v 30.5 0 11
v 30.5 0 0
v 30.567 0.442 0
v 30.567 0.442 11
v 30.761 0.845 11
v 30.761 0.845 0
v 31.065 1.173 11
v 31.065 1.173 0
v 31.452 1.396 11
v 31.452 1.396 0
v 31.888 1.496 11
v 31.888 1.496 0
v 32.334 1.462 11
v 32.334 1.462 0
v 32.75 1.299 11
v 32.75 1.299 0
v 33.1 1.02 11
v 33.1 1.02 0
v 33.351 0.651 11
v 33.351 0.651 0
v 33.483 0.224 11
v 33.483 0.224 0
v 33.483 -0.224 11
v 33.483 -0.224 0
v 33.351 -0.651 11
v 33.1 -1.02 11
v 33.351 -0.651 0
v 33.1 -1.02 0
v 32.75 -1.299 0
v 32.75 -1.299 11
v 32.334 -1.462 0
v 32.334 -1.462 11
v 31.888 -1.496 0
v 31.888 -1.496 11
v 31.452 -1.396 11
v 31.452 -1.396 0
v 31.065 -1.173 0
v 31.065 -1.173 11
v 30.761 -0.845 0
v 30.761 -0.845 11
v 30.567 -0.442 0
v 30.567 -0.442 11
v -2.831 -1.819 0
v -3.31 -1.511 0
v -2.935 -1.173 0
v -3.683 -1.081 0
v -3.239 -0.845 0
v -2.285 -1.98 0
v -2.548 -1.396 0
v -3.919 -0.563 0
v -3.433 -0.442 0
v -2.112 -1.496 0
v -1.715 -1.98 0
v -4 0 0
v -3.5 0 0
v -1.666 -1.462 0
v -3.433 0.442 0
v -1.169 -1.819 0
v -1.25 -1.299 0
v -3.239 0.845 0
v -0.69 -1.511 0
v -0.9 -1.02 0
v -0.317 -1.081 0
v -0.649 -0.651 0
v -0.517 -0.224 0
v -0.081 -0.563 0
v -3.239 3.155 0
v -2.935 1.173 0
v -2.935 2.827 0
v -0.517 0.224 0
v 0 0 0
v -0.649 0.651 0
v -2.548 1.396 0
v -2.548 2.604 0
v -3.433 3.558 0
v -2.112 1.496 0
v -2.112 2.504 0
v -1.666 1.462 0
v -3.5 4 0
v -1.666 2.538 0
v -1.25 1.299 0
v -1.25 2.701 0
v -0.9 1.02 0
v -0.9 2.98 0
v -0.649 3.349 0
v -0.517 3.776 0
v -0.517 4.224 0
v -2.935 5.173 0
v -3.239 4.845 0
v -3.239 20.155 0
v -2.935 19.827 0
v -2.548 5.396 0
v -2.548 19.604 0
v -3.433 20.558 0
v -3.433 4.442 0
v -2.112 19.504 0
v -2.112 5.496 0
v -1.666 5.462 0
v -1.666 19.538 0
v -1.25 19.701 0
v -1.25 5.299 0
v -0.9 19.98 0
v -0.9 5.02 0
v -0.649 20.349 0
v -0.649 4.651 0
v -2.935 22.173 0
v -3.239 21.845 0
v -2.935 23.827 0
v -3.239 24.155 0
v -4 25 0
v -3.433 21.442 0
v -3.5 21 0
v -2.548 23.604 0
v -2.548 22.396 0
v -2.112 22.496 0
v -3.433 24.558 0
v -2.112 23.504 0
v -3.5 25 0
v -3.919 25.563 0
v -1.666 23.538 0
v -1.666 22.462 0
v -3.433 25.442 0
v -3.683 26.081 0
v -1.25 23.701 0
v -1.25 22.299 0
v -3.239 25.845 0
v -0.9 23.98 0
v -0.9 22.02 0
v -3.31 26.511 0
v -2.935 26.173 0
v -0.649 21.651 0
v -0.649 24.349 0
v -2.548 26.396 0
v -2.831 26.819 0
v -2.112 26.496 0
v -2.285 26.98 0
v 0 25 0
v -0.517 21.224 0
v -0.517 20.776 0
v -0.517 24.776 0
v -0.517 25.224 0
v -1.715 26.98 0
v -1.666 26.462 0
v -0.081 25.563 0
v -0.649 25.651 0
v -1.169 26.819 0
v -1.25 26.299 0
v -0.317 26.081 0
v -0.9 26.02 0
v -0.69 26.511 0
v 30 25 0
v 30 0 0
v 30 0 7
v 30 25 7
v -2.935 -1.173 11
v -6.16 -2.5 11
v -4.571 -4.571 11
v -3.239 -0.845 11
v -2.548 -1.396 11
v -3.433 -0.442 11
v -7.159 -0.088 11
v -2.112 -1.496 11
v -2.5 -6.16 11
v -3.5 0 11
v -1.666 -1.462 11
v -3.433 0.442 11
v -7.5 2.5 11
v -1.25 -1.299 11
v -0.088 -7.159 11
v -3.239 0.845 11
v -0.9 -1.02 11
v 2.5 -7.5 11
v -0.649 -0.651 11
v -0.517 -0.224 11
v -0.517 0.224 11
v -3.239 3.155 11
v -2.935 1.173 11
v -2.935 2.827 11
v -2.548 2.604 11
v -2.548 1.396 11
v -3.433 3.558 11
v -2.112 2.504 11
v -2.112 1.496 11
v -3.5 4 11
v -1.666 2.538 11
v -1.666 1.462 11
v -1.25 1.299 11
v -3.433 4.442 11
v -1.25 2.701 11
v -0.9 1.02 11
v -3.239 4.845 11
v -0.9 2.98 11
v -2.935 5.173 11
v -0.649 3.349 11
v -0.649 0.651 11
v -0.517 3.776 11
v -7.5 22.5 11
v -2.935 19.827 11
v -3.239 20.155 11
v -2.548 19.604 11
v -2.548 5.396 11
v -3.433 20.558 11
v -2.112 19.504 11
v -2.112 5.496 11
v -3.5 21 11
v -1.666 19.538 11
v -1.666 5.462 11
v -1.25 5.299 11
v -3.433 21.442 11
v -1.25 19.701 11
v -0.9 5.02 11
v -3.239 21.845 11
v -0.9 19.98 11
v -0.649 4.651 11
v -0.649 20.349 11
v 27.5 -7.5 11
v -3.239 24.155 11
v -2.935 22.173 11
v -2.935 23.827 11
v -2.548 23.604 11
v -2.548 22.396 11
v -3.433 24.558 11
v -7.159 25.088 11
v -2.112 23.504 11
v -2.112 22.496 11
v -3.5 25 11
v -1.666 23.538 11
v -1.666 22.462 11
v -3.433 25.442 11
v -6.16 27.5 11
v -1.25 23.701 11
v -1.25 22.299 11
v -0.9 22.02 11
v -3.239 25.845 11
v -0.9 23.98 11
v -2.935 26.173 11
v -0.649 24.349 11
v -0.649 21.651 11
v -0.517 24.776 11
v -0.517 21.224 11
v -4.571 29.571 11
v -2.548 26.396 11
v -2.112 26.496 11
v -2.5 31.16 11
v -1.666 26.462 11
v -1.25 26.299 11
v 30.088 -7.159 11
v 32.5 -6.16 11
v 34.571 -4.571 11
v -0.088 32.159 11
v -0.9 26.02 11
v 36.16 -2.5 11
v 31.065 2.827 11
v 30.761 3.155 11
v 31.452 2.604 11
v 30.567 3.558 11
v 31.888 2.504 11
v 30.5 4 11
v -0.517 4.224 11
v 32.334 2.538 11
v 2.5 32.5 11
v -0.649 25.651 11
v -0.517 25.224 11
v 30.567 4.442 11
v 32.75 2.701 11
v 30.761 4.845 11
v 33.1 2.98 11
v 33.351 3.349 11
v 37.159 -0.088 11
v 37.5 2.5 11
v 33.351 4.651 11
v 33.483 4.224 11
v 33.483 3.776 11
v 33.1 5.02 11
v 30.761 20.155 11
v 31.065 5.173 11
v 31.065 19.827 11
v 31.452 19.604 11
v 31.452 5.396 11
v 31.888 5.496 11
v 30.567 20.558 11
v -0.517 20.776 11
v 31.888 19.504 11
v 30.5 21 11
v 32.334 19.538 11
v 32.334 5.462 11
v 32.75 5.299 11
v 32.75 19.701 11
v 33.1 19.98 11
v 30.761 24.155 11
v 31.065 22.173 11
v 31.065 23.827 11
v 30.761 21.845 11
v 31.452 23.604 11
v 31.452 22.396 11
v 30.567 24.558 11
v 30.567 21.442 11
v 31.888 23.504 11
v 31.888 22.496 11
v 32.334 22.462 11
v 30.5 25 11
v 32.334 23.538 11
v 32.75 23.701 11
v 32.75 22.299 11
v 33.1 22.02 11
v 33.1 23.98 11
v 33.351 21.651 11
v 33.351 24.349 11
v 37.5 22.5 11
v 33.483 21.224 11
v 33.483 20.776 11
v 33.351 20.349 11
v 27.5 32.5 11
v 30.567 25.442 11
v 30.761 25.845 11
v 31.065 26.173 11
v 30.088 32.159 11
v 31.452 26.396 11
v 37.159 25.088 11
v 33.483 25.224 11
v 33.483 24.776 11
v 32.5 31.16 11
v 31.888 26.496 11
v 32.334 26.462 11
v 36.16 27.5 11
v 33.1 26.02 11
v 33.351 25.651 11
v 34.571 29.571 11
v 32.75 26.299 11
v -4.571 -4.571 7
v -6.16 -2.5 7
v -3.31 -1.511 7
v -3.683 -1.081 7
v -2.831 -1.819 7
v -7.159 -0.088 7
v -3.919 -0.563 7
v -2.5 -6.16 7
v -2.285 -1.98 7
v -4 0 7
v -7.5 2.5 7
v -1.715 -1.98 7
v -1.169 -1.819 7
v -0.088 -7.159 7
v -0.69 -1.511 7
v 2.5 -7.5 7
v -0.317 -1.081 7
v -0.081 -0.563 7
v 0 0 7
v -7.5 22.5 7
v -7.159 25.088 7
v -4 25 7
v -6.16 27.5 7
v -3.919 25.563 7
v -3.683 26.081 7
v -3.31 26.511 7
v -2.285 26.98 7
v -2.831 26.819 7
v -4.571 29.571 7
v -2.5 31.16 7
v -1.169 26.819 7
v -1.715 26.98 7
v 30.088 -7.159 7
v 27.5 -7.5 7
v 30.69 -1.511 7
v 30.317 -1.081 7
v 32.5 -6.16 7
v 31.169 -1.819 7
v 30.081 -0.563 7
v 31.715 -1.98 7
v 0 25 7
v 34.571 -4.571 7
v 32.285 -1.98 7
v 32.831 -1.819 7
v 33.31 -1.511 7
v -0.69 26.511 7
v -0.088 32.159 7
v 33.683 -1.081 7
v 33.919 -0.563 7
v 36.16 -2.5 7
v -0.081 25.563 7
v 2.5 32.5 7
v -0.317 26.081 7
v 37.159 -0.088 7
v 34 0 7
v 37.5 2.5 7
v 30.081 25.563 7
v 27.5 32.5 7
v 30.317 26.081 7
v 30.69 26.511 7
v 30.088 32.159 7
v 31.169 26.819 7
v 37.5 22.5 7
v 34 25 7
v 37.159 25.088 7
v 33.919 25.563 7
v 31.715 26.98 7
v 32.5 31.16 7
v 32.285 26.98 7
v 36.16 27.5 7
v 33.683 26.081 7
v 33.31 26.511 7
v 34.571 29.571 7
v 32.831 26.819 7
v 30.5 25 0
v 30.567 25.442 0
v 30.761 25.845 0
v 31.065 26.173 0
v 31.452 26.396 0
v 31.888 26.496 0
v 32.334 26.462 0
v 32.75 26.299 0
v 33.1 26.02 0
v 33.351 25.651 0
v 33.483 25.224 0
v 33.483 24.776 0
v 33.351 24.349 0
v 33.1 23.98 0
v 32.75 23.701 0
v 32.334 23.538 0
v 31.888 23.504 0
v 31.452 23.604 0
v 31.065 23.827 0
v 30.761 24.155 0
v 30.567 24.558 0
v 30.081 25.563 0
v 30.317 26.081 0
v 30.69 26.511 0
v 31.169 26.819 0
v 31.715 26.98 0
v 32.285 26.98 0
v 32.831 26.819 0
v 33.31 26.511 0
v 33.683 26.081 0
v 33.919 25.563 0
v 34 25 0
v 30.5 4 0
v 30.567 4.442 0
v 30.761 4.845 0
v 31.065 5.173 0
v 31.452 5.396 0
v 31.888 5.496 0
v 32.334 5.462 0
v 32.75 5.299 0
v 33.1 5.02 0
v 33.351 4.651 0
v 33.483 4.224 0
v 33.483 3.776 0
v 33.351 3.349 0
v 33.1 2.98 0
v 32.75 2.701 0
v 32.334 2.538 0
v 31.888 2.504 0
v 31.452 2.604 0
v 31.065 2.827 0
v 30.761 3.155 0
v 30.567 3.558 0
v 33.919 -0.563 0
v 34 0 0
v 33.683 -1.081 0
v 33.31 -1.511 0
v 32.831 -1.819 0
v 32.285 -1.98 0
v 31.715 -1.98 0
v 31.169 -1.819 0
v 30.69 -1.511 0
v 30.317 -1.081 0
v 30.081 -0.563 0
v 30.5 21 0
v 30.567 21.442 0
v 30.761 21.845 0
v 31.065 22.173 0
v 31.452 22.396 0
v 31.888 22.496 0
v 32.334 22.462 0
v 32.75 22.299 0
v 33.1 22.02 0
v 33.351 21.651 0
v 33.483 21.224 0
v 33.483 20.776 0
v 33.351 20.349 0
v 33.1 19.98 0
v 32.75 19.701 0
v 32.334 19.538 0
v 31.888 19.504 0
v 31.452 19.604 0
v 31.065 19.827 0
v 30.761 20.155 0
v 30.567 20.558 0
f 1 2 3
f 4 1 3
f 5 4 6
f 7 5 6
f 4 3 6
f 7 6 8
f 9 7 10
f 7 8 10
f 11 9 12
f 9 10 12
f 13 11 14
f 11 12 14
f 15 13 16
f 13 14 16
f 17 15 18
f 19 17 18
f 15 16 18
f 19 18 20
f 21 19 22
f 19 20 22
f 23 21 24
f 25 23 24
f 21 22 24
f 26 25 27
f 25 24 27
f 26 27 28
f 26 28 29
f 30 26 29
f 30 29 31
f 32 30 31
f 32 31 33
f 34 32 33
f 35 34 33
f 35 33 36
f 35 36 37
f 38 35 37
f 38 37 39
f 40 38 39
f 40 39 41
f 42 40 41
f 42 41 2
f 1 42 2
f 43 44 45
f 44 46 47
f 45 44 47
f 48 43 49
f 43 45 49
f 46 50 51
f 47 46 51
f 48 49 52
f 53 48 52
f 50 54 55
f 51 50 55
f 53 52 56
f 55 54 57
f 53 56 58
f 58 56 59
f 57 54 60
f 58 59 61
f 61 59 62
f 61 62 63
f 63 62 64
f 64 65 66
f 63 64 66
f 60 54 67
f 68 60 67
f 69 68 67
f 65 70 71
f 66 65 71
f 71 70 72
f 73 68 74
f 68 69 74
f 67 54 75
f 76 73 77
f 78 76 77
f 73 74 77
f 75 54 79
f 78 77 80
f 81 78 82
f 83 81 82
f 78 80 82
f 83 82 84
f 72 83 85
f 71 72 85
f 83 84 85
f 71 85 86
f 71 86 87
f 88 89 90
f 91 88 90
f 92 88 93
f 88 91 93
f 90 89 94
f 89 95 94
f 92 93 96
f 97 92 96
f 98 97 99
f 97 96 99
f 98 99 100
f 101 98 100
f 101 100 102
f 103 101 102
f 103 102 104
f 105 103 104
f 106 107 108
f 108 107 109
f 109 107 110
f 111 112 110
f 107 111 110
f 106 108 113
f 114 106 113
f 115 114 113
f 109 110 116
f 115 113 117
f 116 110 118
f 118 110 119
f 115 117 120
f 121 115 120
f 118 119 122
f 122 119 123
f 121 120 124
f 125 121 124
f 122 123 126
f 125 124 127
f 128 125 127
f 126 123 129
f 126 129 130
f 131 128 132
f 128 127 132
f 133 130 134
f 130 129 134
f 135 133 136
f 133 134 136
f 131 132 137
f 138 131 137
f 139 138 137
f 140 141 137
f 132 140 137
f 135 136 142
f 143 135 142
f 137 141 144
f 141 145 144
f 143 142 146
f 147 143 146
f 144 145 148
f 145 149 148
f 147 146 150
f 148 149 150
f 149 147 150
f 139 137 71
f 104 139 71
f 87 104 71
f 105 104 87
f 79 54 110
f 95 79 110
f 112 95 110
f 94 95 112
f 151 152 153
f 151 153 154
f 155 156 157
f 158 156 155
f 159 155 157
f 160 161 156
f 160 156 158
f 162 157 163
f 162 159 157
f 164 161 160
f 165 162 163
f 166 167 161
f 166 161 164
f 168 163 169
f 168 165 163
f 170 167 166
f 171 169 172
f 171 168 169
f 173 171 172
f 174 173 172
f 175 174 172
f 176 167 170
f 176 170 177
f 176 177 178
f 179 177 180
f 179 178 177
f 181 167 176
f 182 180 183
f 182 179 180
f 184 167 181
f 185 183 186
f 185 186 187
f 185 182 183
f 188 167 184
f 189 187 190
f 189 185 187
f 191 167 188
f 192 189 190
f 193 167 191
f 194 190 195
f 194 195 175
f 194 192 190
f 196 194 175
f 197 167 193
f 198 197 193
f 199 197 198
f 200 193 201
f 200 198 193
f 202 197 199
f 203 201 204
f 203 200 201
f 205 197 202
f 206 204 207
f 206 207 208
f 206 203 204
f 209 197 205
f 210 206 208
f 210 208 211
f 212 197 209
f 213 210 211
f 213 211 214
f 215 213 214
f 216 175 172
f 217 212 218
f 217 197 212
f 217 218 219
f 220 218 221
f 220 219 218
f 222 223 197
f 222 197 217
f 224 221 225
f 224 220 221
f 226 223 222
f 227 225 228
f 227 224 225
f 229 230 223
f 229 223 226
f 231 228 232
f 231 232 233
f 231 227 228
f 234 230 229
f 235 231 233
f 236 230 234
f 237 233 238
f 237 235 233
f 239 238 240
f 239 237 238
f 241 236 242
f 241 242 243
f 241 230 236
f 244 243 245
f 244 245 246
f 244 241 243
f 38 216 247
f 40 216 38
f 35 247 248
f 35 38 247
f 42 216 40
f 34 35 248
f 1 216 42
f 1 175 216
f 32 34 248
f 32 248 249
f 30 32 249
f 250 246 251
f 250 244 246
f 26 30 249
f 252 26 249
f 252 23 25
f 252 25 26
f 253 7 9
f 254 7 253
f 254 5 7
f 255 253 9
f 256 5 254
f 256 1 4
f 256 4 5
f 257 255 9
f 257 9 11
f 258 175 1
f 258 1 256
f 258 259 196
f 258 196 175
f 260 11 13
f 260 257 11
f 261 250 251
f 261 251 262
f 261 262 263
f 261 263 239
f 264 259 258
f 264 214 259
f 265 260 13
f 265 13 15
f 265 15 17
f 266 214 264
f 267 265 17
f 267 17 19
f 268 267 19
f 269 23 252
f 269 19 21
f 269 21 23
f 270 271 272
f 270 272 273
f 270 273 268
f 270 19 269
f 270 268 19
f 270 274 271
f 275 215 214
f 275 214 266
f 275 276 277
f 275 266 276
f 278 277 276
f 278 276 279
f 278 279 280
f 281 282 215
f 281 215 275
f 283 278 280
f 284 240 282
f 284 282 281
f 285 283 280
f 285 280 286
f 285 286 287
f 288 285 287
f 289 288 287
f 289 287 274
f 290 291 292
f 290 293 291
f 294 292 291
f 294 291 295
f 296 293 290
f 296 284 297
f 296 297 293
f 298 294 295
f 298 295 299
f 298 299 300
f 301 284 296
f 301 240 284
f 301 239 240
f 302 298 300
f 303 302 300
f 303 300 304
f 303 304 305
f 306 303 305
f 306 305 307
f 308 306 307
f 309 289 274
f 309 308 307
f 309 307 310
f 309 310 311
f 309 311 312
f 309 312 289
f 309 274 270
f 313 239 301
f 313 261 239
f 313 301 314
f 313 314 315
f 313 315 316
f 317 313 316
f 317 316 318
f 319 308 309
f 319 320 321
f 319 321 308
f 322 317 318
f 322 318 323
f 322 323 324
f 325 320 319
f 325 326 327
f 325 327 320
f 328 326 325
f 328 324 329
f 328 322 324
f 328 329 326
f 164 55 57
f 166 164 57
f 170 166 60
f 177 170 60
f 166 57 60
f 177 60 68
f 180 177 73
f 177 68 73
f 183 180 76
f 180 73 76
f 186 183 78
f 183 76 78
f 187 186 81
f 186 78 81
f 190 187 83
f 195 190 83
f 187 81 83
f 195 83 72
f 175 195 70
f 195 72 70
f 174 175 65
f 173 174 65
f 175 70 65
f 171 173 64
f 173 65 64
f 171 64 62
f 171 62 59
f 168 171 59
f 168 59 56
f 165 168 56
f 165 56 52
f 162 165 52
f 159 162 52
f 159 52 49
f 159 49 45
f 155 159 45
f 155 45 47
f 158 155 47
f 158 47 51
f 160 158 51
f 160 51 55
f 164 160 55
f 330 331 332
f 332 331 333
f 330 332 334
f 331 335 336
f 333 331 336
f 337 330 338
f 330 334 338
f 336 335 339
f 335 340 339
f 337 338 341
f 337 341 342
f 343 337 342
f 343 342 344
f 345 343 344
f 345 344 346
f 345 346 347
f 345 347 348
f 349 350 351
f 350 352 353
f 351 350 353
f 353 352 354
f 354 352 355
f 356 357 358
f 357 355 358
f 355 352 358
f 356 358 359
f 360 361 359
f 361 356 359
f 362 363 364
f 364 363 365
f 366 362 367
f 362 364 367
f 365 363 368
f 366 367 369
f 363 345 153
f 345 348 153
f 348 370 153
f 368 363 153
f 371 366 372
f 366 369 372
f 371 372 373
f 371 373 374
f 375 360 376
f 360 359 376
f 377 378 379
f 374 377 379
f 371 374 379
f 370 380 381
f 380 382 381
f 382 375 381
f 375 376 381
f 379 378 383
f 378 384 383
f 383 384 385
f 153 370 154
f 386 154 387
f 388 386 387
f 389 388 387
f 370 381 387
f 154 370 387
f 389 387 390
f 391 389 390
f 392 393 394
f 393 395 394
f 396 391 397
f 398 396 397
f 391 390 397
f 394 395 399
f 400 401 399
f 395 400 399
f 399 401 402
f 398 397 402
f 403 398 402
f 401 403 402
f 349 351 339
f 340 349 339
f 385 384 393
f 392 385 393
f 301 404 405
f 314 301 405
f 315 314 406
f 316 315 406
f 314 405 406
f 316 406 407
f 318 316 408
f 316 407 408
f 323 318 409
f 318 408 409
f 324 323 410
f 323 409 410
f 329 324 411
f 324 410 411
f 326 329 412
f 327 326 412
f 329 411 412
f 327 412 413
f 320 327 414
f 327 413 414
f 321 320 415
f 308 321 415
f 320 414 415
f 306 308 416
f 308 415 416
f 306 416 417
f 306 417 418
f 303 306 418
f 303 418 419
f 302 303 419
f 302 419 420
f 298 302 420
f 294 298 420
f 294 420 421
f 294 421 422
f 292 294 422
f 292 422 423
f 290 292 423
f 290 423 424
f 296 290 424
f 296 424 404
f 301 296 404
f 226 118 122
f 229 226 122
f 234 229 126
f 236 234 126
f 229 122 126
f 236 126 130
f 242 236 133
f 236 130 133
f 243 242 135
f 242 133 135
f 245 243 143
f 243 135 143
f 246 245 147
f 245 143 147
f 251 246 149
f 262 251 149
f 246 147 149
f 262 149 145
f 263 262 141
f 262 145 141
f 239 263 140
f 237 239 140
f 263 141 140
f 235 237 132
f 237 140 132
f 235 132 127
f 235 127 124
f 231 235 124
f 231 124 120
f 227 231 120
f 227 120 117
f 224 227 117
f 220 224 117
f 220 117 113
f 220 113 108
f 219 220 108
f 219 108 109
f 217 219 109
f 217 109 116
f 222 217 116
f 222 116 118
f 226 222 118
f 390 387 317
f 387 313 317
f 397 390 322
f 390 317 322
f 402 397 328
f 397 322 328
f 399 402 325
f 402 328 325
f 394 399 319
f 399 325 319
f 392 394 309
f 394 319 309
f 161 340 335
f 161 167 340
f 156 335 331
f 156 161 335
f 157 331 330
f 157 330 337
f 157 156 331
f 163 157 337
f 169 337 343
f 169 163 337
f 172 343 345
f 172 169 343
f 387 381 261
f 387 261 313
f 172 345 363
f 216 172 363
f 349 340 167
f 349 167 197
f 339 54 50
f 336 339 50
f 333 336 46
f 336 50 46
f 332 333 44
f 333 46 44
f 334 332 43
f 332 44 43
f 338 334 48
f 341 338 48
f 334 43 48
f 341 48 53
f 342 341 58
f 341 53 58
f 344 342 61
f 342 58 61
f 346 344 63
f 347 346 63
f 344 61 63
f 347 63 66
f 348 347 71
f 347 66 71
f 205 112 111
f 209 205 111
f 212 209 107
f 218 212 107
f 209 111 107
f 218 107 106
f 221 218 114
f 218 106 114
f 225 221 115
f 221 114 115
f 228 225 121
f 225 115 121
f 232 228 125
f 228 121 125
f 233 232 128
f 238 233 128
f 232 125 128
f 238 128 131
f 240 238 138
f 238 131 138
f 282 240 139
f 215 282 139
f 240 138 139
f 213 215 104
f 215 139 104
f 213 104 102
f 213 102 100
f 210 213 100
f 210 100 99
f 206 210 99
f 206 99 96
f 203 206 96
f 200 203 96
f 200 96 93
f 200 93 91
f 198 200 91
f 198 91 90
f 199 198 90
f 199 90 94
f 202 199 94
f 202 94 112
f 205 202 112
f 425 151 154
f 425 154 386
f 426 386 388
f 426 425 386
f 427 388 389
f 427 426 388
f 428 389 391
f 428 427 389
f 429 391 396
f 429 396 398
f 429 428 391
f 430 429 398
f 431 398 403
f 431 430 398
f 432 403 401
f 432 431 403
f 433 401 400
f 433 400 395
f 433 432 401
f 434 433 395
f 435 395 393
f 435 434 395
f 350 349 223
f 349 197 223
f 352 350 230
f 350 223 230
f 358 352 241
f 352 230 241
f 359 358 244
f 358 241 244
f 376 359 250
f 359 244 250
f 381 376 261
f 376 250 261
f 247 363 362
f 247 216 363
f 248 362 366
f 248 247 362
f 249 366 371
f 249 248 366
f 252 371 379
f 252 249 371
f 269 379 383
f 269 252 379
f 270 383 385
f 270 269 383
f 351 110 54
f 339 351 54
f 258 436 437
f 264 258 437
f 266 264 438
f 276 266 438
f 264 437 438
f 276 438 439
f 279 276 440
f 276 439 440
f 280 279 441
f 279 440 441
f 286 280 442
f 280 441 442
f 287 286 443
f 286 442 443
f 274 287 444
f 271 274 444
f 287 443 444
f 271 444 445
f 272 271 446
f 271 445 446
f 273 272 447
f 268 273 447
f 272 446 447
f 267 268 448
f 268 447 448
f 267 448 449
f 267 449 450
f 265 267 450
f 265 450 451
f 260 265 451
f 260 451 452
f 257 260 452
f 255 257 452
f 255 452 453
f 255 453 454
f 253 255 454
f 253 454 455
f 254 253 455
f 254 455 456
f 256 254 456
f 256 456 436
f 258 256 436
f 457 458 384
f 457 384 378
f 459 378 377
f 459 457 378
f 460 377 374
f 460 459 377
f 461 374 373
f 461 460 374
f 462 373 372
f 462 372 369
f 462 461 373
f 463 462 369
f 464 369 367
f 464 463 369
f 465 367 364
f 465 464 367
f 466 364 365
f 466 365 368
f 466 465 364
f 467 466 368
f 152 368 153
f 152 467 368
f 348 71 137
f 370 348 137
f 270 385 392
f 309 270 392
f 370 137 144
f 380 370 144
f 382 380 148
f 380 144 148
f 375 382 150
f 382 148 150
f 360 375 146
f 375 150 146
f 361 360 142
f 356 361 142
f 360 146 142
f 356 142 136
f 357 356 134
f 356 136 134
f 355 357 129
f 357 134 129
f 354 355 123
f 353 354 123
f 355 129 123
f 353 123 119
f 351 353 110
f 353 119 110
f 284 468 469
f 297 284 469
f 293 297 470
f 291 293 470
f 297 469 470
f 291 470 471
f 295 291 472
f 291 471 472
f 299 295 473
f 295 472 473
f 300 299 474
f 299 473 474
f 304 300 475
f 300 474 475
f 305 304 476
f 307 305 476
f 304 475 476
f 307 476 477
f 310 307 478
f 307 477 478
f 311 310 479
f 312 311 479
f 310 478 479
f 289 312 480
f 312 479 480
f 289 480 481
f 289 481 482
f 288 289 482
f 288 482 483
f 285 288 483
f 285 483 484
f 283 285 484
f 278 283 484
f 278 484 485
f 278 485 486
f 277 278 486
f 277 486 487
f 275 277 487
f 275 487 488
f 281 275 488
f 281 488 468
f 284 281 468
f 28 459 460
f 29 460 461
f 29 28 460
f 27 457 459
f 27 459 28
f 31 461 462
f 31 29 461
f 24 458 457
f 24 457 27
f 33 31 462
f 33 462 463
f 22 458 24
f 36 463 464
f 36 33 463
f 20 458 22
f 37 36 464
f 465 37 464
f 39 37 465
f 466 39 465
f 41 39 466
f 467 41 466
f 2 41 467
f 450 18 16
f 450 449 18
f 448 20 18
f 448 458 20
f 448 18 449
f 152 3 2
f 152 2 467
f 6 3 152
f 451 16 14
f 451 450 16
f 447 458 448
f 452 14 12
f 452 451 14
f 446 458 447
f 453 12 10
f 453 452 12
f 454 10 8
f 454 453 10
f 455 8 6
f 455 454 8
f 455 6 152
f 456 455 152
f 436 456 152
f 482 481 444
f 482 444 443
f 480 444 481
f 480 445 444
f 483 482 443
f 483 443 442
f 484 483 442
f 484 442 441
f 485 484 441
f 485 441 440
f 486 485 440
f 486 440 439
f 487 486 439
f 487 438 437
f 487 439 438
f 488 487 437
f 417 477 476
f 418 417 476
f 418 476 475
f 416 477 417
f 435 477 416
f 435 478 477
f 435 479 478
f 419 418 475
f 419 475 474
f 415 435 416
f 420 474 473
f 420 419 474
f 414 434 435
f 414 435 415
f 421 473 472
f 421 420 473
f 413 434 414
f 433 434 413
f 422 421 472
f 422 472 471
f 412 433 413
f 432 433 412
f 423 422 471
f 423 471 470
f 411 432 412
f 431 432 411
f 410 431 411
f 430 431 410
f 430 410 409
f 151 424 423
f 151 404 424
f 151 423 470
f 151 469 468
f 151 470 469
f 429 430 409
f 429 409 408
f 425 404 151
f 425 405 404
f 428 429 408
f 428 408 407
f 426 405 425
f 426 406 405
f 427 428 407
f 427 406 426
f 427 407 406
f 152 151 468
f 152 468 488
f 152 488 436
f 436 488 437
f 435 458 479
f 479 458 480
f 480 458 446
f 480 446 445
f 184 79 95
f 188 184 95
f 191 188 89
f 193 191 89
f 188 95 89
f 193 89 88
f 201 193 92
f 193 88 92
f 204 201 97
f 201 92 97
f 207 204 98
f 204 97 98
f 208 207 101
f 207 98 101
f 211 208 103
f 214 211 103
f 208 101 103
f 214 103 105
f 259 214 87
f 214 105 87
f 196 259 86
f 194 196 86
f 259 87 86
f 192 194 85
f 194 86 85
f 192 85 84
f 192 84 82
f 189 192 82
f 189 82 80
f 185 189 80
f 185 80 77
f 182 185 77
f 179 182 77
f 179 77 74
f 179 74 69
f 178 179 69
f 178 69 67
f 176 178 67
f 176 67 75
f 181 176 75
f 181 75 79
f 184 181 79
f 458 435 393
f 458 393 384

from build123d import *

# Parameters (mm, degrees)
BOSS_EXTRUDE1_DEPTH   = 7
BOSS_EXTRUDE1_2_DEPTH = 7
SKETCH2_W             = 45
SKETCH2_H             = 40
BOSS_EXTRUDE2_DEPTH   = 4
FILLET1_R             = 10
SKETCH3_R             = 1.5
CUT_EXTRUDE1_DEPTH    = 16


with BuildPart() as part:
    # Sketch1 → Boss-Extrude1 (new body)
    with BuildSketch(Plane.XY):
        with BuildLine():
            Line((0, 0), (0, 25))
            ThreePointArc((0, 25), (-2, 27), (-4, 25))
            Line((-4, 25), (-4, 0))
            ThreePointArc((-4, 0), (-2, -2), (0, 0))
        make_face()
    extrude(amount=BOSS_EXTRUDE1_DEPTH)



with BuildPart() as body_2:
    # Sketch1 → Boss-Extrude1 2 (new body)
    with BuildSketch(Plane.XY):
        with BuildLine():
            Line((30, 0), (30, 25))
            ThreePointArc((30, 25), (32, 27), (34, 25))
            Line((34, 25), (34, 0))
            ThreePointArc((34, 0), (32, -2), (30, 0))
        make_face()
    extrude(amount=BOSS_EXTRUDE1_2_DEPTH)


with BuildPart() as part_1:
    add(part.part)

    add(body_2.part)  # Boss-Extrude2 merges body 2
    # Sketch2 → Boss-Extrude2 (add)
    with BuildSketch(Plane.XY.offset(7)):
        with Locations((15, 12.5)):
            Rectangle(SKETCH2_W, SKETCH2_H)
    extrude(amount=BOSS_EXTRUDE2_DEPTH)

    # Fillet1
    fillet1_edges = [part_1.edges().sort_by_distance(p)[0] for p in [
        (37.5, -7.5, 9),
        (37.5, 32.5, 9),
        (-7.5, 32.5, 9),
        (-7.5, -7.5, 9),
    ]]
    fillet(fillet1_edges, radius=FILLET1_R)

    # Sketch3 → Cut-Extrude1 (cut)
    with BuildSketch(Plane(origin=(0, 0, 0), x_dir=(-1, 0, 0), z_dir=(0, 0, -1))):
        with Locations((-32, 0)):
            Circle(SKETCH3_R)
        with Locations((-32, 4)):
            Circle(SKETCH3_R)
        with Locations((2, 0)):
            Circle(SKETCH3_R)
        with Locations((2, 4)):
            Circle(SKETCH3_R)
        with Locations((-32, 25)):
            Circle(SKETCH3_R)
        with Locations((-32, 21)):
            Circle(SKETCH3_R)
        with Locations((2, 25)):
            Circle(SKETCH3_R)
        with Locations((2, 21)):
            Circle(SKETCH3_R)
    extrude(amount=-CUT_EXTRUDE1_DEPTH, mode=Mode.SUBTRACT)


solid = part_1.part
